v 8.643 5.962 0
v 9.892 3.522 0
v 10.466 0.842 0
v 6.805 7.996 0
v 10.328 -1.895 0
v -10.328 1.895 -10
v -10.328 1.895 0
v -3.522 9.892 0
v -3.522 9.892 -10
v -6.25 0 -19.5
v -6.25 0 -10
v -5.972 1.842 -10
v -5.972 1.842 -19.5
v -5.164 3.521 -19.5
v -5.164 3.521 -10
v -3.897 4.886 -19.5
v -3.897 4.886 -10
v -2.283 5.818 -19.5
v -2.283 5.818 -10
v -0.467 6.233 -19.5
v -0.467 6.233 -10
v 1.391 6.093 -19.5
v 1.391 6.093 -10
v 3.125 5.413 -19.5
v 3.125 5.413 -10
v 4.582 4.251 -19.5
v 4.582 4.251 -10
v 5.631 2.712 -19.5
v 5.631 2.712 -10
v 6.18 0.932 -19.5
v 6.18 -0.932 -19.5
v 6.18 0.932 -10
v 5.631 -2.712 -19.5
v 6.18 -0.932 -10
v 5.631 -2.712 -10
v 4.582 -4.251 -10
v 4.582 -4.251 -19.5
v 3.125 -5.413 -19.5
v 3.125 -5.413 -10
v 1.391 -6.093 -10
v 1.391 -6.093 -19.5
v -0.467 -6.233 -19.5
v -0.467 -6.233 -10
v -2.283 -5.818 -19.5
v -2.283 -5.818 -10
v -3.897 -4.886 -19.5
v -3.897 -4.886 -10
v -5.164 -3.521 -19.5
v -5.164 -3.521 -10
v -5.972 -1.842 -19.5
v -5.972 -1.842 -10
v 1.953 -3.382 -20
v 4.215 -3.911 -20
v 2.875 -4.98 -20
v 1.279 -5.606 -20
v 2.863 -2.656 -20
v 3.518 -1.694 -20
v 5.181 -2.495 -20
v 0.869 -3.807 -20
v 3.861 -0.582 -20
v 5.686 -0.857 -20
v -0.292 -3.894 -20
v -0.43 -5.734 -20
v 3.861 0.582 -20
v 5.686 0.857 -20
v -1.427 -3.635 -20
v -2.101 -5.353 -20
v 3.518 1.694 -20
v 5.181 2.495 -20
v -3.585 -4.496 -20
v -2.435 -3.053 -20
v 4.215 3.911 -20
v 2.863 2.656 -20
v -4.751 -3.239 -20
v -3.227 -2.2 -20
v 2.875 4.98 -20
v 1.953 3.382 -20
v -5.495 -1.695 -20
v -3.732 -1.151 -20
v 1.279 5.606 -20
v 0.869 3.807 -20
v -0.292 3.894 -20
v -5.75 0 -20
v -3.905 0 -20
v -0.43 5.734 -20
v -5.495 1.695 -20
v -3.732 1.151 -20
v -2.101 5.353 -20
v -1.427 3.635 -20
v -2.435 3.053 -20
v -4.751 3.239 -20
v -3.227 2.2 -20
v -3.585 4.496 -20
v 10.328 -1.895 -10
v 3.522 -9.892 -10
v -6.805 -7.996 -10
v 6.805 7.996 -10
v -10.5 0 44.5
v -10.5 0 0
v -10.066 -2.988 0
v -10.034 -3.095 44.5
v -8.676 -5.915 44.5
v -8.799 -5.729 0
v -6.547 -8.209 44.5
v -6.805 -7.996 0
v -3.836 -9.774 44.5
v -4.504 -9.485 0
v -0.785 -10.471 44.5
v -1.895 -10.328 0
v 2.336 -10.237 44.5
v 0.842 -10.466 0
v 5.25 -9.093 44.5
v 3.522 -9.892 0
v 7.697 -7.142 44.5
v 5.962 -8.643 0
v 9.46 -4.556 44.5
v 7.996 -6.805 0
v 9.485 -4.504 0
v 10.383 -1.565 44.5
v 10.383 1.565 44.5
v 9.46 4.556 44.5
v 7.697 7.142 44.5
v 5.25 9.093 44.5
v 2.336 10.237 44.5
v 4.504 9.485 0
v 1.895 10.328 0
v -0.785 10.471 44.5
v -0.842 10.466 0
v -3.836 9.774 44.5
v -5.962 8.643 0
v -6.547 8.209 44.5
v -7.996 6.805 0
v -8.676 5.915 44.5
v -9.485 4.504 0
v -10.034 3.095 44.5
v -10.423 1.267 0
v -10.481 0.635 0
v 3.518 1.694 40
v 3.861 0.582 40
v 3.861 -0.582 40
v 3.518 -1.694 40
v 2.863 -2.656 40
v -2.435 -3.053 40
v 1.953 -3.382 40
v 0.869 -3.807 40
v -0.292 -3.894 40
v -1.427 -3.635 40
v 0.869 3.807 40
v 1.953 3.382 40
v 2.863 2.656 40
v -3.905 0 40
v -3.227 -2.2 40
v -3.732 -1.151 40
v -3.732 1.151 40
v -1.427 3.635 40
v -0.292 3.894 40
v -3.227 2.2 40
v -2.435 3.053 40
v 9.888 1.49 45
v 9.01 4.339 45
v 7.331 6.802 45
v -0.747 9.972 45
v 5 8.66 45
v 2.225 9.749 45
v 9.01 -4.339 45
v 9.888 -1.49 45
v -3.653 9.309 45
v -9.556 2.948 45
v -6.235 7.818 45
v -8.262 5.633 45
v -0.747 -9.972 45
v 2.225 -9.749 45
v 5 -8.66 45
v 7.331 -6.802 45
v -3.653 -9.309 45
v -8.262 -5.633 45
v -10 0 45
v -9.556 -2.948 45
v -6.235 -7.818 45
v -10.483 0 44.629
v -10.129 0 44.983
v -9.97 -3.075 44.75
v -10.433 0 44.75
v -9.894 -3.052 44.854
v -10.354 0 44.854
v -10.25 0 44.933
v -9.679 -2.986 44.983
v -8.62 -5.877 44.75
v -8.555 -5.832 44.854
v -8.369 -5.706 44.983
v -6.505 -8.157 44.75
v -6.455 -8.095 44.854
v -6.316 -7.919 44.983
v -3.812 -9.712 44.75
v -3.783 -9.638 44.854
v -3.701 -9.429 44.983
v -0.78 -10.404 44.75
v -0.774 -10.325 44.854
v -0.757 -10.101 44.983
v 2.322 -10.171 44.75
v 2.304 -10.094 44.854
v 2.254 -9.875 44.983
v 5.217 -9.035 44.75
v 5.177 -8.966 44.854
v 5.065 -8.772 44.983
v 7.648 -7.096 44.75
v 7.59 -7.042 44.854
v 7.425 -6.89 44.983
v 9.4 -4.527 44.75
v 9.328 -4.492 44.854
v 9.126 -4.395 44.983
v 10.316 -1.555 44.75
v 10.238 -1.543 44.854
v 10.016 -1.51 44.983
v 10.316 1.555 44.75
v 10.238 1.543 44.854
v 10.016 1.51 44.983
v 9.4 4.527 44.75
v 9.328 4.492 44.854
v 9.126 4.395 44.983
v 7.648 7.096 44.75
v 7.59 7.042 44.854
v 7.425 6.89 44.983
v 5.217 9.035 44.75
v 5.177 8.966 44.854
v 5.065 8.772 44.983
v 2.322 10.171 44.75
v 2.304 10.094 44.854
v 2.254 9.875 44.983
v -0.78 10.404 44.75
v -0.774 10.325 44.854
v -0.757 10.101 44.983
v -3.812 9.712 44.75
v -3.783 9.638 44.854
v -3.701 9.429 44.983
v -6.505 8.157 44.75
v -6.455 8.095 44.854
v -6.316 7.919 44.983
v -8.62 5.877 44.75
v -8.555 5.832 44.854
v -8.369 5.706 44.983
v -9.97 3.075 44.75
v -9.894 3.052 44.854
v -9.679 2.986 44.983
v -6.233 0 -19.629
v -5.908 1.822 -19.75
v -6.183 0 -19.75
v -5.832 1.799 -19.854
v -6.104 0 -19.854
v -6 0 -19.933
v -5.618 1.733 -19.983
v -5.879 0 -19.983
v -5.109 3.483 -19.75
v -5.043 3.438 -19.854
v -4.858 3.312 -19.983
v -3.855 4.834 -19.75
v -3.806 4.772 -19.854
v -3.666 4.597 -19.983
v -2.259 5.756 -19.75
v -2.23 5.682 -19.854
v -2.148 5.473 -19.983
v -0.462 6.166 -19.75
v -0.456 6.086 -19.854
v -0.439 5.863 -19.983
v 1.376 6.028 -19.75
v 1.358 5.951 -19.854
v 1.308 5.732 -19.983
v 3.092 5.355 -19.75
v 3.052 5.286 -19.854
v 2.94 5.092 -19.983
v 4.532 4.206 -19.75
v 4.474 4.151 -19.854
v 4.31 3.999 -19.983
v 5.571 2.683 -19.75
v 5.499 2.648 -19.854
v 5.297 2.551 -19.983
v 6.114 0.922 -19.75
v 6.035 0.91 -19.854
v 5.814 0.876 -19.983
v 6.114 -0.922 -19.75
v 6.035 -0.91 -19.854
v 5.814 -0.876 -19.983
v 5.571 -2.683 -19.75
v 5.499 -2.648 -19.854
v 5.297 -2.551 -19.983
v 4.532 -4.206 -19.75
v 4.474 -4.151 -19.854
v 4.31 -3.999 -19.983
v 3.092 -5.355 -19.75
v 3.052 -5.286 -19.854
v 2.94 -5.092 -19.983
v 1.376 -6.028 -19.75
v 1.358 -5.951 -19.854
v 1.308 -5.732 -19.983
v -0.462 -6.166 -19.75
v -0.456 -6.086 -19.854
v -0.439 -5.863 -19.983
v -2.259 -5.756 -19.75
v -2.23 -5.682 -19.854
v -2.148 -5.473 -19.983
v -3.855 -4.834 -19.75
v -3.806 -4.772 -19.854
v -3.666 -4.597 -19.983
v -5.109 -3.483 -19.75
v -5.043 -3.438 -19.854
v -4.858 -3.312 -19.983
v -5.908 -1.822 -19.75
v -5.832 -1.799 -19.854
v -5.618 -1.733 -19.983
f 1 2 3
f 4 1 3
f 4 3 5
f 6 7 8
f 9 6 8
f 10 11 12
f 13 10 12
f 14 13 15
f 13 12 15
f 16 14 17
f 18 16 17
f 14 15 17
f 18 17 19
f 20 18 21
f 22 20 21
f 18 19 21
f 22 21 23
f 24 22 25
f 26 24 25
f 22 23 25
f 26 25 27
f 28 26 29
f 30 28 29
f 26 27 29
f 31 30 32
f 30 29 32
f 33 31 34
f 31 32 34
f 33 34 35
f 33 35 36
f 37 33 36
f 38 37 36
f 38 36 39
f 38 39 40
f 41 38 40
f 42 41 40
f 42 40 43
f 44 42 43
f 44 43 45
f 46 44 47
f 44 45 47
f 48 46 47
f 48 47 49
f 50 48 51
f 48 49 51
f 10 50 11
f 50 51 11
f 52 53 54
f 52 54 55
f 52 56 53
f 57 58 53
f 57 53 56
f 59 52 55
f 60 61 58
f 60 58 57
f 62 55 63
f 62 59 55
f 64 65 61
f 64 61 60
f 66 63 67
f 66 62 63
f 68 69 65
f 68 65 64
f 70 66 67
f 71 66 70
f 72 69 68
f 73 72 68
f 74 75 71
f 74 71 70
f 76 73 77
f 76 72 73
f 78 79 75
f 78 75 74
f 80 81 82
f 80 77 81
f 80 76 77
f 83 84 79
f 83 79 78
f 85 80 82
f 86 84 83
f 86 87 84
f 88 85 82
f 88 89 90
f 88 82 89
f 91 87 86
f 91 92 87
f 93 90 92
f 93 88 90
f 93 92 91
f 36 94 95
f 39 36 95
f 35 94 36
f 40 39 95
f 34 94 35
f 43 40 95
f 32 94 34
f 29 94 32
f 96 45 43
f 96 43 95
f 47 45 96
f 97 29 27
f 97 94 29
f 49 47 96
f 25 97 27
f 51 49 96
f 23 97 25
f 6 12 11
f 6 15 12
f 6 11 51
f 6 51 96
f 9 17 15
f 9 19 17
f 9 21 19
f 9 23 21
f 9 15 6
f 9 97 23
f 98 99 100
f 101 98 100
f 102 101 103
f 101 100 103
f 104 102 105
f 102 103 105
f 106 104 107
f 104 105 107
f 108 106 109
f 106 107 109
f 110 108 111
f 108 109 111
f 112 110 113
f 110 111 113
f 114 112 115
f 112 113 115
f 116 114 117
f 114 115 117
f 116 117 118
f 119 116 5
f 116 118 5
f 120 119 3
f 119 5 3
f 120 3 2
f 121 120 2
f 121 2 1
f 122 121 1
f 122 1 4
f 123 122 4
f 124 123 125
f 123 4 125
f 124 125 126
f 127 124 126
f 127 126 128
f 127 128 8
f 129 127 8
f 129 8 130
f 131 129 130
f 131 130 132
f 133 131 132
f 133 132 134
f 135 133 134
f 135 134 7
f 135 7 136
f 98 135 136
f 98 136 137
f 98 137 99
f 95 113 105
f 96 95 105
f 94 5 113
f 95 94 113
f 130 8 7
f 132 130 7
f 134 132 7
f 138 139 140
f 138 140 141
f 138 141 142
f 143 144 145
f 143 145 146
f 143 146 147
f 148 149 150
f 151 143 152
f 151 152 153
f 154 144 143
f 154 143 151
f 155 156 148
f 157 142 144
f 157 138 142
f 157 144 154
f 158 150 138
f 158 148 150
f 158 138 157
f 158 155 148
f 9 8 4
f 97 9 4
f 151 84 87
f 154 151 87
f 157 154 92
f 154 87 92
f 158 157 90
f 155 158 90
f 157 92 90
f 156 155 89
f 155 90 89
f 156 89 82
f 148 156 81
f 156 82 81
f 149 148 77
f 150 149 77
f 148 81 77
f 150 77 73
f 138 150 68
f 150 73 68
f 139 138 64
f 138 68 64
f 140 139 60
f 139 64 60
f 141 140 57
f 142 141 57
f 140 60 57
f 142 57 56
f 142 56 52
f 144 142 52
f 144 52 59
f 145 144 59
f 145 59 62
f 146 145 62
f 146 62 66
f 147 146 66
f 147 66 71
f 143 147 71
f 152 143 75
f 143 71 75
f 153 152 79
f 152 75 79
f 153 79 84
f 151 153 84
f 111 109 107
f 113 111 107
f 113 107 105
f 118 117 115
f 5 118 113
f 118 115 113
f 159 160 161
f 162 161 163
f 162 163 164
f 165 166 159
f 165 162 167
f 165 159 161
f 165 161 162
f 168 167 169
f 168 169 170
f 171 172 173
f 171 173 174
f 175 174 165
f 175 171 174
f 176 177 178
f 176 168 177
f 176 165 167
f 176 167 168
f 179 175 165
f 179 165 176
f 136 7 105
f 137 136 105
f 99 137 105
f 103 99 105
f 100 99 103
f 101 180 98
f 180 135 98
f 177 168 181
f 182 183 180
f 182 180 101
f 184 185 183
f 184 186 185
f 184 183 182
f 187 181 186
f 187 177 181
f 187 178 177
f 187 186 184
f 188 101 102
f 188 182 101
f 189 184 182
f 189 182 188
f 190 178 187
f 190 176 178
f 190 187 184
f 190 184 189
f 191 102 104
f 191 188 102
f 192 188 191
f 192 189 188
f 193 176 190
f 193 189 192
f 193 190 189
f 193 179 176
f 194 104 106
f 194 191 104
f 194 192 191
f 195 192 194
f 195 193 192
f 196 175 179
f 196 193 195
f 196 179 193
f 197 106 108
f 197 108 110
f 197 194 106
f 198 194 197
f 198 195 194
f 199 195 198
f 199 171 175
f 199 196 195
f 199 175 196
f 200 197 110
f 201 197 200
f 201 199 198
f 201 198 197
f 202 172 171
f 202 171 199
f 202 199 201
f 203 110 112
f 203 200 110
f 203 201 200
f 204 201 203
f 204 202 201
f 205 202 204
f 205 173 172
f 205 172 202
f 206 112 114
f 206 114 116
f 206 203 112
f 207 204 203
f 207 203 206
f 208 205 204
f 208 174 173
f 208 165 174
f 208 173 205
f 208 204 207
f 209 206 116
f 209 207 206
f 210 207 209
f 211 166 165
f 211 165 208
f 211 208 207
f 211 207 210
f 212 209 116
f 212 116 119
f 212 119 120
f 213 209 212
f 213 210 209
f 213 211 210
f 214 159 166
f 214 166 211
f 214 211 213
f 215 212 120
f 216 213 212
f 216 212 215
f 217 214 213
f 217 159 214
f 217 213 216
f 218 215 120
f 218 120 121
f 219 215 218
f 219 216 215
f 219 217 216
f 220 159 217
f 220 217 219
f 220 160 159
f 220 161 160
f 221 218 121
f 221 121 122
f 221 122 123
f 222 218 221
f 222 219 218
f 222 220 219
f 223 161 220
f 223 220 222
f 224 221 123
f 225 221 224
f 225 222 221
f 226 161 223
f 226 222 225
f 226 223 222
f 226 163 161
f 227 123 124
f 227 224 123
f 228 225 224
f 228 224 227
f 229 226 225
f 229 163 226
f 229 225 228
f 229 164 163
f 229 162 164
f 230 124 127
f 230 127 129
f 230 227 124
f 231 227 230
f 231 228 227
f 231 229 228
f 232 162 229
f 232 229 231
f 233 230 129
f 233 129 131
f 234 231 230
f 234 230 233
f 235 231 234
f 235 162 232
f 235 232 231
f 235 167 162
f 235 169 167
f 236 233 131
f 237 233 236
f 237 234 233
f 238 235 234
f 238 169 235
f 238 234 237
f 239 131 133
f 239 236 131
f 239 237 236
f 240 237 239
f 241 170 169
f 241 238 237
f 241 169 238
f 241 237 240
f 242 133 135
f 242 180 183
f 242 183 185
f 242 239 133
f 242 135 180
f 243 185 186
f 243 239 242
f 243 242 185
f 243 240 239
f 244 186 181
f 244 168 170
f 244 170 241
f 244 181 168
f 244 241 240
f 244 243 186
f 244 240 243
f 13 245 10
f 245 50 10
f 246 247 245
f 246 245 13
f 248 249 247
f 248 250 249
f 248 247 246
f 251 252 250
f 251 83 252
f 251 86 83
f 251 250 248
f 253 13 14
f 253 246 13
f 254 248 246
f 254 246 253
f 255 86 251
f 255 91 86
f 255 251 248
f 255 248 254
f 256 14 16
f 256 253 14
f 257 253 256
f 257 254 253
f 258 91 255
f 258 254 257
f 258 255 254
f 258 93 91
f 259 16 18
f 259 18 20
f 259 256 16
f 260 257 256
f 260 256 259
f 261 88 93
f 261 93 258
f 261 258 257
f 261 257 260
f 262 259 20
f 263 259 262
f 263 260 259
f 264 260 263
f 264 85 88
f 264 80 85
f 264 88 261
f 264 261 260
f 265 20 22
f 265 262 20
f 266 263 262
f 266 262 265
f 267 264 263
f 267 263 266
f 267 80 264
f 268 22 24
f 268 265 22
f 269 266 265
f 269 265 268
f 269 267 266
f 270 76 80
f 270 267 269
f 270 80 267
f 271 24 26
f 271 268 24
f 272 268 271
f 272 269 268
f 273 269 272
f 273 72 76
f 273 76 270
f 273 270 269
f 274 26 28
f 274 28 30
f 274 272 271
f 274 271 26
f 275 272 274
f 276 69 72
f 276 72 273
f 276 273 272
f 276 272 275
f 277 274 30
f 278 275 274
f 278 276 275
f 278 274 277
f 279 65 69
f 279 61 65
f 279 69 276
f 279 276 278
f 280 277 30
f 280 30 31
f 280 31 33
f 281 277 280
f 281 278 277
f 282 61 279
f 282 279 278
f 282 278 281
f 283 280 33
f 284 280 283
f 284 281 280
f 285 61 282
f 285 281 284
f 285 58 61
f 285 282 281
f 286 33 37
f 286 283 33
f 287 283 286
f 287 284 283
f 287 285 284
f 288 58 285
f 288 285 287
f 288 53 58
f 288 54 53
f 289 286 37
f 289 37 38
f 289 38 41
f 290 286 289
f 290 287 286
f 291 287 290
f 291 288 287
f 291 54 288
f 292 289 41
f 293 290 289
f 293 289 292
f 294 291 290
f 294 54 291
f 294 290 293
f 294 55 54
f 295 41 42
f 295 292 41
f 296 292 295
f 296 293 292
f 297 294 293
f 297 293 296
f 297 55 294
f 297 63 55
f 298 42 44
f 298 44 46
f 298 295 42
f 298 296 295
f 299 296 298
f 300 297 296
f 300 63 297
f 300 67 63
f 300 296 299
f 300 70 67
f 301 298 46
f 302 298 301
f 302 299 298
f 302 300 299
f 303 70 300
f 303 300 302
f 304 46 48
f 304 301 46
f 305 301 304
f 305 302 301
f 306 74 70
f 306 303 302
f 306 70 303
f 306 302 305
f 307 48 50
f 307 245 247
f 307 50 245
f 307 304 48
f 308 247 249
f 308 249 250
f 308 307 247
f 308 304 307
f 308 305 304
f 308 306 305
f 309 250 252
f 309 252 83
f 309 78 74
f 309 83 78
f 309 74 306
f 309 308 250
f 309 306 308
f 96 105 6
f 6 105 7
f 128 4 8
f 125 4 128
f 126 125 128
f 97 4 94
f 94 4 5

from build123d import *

# Parameters (mm, degrees)
SKETCH_1_R          = 10.5
EXTRUDE_1_DEPTH     = 45
EXTRUDE_2_DEPTH     = 10
SKETCH_3_R          = 6.25
EXTRUDE_3_DEPTH     = 10
FILLET_1_R          = 0.5
SKETCH_4_R          = 3.905073707
CUT_EXTRUDE_1_DEPTH = 60


with BuildPart() as part:
    # 草图1 → 凸台-拉伸1 (new body)
    with BuildSketch(Plane.XY):
        with Locations(Location((0, 0, 0), (0, 0, 180))):
            Circle(SKETCH_1_R)
    extrude(amount=EXTRUDE_1_DEPTH)

    # 草图2 → 凸台-拉伸2 (add)
    with BuildSketch(Plane(origin=(0, 0, 0), x_dir=(-1, 0, 0), z_dir=(0, 0, -1))):
        Polygon((6.805240256, -7.996168149), (10.327504878, 1.895426866), (3.522264622, 9.891595015), (-6.805240256, 7.996168149), (-10.327504878, -1.895426866), (-3.522264622, -9.891595015), align=None)
    extrude(amount=EXTRUDE_2_DEPTH)

    # 草图3 → 凸台-拉伸3 (add)
    with BuildSketch(Plane(origin=(0, 0, -10), x_dir=(-1, 0, 0), z_dir=(0, 0, -1))):
        Circle(SKETCH_3_R)
    extrude(amount=EXTRUDE_3_DEPTH)

    # 圆角1
    fillet_1_edges = [part.edges().sort_by_distance(p)[0] for p in [
        (6.25, 0, -20),
        (10.5, 0, 45),
    ]]
    fillet(fillet_1_edges, radius=FILLET_1_R)

    # 草图4 → 切除-拉伸1 (cut)
    with BuildSketch(Plane(origin=(0, 0, -20), x_dir=(-1, 0, 0), z_dir=(0, 0, -1))):
        Circle(SKETCH_4_R)
    extrude(amount=-CUT_EXTRUDE_1_DEPTH, mode=Mode.SUBTRACT)


solid = part.part
